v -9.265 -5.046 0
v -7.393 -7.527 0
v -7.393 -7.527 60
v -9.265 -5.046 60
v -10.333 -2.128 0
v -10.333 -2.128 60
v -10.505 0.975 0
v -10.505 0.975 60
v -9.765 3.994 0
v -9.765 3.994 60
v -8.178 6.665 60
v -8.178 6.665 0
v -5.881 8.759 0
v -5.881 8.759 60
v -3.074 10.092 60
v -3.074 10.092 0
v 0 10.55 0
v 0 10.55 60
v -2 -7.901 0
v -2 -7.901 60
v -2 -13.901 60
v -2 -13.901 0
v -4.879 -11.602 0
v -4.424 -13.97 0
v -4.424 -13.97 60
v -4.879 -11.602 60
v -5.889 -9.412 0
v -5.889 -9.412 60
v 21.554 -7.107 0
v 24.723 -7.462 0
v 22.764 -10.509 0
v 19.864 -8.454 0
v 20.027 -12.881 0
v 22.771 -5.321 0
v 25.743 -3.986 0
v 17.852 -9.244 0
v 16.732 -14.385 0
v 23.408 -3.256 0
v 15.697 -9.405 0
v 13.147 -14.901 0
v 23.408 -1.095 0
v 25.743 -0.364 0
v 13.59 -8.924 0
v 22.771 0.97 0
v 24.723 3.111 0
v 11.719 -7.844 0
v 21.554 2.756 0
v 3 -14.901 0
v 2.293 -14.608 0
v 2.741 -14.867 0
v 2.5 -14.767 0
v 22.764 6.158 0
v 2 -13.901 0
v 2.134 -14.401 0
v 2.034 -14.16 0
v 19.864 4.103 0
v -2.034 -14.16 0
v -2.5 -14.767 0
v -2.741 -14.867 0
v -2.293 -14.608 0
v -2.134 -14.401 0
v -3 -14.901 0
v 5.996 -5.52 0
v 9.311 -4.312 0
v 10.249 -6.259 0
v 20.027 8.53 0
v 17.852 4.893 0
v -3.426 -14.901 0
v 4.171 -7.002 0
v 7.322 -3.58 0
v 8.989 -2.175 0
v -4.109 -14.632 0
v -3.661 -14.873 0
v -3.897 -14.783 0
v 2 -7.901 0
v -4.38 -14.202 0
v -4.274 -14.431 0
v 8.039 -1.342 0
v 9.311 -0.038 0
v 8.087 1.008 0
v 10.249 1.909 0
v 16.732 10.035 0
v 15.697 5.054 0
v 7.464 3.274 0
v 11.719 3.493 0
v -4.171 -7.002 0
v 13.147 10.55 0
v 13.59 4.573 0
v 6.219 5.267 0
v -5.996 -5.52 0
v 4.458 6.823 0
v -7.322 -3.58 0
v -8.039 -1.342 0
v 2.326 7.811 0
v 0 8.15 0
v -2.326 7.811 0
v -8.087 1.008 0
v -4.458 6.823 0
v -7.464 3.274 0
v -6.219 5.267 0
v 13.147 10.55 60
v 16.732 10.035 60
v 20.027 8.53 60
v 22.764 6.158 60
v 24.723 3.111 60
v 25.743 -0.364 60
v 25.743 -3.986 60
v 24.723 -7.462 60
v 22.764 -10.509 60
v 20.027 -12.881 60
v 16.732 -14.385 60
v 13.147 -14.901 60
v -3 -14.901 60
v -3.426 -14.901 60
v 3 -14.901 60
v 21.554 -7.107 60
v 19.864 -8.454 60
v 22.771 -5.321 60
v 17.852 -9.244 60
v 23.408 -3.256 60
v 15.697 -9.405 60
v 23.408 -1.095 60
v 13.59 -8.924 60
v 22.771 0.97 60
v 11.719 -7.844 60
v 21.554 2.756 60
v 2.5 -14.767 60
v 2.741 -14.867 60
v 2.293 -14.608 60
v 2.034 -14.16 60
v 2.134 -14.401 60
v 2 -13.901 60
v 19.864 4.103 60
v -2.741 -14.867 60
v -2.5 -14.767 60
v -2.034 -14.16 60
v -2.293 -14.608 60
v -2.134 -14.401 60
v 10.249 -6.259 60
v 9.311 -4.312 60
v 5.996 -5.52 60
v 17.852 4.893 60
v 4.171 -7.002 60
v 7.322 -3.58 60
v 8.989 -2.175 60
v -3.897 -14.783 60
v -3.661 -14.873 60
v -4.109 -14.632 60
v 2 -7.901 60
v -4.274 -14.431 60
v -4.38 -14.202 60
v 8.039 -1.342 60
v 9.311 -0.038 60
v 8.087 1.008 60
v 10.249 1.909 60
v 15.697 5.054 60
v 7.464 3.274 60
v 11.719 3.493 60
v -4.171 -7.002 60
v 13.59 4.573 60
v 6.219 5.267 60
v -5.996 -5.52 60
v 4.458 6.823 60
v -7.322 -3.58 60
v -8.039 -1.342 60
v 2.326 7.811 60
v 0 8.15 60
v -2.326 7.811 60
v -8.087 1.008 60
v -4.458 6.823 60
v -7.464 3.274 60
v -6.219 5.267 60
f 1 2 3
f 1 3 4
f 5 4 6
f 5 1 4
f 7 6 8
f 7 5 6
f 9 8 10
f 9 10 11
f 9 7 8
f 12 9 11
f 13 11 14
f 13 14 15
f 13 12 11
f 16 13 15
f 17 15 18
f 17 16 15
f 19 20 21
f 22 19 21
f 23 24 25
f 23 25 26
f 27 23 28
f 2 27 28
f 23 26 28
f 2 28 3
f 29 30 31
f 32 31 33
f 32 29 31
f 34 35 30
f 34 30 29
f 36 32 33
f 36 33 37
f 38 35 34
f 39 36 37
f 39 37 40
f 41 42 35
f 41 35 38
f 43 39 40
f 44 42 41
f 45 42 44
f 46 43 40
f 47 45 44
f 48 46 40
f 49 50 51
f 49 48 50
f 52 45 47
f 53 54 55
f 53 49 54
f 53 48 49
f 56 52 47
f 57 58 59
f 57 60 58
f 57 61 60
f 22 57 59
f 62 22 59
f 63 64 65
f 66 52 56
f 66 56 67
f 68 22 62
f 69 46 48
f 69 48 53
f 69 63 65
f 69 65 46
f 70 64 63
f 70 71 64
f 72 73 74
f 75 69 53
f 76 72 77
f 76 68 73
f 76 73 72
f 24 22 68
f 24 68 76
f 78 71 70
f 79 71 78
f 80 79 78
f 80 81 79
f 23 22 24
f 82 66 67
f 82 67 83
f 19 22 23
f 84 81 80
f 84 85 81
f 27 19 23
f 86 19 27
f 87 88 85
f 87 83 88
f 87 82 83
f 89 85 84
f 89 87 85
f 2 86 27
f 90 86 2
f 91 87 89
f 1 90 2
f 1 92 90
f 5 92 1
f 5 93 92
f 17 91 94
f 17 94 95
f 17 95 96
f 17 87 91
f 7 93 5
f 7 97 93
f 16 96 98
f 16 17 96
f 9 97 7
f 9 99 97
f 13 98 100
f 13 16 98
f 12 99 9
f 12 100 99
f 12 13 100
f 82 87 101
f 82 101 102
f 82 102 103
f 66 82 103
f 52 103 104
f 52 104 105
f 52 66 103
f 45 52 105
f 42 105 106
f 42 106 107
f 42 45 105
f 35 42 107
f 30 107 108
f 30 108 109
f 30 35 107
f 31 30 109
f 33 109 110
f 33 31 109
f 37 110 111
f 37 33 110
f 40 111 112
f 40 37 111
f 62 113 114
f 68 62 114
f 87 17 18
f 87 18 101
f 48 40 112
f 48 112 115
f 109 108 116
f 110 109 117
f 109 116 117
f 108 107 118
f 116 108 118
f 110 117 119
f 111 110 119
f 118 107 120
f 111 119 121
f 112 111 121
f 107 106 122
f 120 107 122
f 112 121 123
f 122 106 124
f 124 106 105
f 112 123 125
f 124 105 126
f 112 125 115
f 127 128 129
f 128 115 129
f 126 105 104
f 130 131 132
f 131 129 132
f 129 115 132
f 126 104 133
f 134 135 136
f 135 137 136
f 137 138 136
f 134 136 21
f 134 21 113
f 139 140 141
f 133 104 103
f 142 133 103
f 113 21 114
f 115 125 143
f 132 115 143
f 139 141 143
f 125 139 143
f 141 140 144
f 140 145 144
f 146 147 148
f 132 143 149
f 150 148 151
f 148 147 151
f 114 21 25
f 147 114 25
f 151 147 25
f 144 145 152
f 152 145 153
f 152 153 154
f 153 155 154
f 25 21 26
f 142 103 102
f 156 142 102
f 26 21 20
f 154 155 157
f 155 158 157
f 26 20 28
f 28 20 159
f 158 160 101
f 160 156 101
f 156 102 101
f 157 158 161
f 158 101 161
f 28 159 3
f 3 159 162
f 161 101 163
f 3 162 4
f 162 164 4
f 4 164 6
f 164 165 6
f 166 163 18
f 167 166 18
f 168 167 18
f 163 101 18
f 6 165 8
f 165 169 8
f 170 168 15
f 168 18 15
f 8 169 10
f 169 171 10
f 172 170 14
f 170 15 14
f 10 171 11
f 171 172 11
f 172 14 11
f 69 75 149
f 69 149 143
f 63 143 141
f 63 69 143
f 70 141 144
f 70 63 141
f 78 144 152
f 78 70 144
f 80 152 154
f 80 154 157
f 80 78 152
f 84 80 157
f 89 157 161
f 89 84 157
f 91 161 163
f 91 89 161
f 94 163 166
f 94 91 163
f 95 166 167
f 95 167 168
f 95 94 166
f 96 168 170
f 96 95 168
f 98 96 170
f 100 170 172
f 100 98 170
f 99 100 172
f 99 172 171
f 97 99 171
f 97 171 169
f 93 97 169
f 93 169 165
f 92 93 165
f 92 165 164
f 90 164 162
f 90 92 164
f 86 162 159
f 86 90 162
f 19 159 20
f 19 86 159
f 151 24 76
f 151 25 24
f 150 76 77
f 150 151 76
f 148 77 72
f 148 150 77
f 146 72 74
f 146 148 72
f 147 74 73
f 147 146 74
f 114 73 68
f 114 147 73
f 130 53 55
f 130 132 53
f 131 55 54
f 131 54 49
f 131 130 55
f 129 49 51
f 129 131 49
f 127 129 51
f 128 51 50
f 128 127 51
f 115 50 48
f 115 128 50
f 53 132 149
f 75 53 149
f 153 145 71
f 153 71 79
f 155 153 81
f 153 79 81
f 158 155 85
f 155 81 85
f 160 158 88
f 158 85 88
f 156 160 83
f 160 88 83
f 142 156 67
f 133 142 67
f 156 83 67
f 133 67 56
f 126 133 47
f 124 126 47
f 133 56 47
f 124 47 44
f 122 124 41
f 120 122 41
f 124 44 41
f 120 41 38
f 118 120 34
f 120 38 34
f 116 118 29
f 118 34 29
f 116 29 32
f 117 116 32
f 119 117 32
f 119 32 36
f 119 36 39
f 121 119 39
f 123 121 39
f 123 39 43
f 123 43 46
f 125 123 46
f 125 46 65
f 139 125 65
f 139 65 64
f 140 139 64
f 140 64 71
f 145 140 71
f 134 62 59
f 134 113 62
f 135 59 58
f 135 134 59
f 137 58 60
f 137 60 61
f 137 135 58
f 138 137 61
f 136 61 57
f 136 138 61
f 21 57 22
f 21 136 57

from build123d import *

# Parameters (mm, degrees)
BOSS_EXTRU_1_DEPTH      = 60
ESQUISSE2_R             = 7.25
ENL_V_MAT_EXTRU_1_DEPTH = 61
CONG_1_R                = 10
CONG_2_R                = 1


with BuildPart() as part:
    # Esquisse1 → Boss.-Extru.1 (new body)
    with BuildSketch(Plane.XY):
        with BuildLine():
            Line((-2, -7.9007911), (-2, -14.9007911))
            Line((-2, -14.9007911), (-4.4, -14.9007911))
            Line((-4.4, -14.9007911), (-4.4, -9.588665183))
            ThreePointArc((-4.4, -9.588665183), (-10.306864647, 2.251897235), (0, 10.55))
            Line((0, 10.55), (13.147142873, 10.55))
            ThreePointArc((13.147142873, 10.55), (25.872538423, -2.17539555), (13.147142873, -14.9007911))
            Line((13.147142873, -14.9007911), (4.4, -14.9007911))
            Line((4.4, -14.9007911), (2, -14.9007911))
            Line((2, -14.9007911), (2, -7.9007911))
            ThreePointArc((2, -7.9007911), (0, 8.15), (-2, -7.9007911))
        make_face()
    extrude(amount=BOSS_EXTRU_1_DEPTH)

    # Esquisse2 → Enlèv. mat.-Extru.1 (cut, through all)
    with BuildSketch(Plane(origin=(0, 0, 0), x_dir=(-1, 0, 0), z_dir=(0, 0, -1))):
        with Locations((-16.23903239, -2.17539555)):
            Circle(ESQUISSE2_R)
    extrude(amount=-ENL_V_MAT_EXTRU_1_DEPTH, mode=Mode.SUBTRACT)

    # Congé1
    cong_1_edges = [part.edges().sort_by_distance(p)[0] for p in [
        (-4.4, -9.588665183, 30),
    ]]
    fillet(cong_1_edges, radius=CONG_1_R)

    # Congé2
    cong_2_edges = [part.edges().sort_by_distance(p)[0] for p in [
        (-4.4, -14.9007911, 30),
        (-2, -14.9007911, 30),
        (2, -14.9007911, 30),
    ]]
    fillet(cong_2_edges, radius=CONG_2_R)


solid = part.part
